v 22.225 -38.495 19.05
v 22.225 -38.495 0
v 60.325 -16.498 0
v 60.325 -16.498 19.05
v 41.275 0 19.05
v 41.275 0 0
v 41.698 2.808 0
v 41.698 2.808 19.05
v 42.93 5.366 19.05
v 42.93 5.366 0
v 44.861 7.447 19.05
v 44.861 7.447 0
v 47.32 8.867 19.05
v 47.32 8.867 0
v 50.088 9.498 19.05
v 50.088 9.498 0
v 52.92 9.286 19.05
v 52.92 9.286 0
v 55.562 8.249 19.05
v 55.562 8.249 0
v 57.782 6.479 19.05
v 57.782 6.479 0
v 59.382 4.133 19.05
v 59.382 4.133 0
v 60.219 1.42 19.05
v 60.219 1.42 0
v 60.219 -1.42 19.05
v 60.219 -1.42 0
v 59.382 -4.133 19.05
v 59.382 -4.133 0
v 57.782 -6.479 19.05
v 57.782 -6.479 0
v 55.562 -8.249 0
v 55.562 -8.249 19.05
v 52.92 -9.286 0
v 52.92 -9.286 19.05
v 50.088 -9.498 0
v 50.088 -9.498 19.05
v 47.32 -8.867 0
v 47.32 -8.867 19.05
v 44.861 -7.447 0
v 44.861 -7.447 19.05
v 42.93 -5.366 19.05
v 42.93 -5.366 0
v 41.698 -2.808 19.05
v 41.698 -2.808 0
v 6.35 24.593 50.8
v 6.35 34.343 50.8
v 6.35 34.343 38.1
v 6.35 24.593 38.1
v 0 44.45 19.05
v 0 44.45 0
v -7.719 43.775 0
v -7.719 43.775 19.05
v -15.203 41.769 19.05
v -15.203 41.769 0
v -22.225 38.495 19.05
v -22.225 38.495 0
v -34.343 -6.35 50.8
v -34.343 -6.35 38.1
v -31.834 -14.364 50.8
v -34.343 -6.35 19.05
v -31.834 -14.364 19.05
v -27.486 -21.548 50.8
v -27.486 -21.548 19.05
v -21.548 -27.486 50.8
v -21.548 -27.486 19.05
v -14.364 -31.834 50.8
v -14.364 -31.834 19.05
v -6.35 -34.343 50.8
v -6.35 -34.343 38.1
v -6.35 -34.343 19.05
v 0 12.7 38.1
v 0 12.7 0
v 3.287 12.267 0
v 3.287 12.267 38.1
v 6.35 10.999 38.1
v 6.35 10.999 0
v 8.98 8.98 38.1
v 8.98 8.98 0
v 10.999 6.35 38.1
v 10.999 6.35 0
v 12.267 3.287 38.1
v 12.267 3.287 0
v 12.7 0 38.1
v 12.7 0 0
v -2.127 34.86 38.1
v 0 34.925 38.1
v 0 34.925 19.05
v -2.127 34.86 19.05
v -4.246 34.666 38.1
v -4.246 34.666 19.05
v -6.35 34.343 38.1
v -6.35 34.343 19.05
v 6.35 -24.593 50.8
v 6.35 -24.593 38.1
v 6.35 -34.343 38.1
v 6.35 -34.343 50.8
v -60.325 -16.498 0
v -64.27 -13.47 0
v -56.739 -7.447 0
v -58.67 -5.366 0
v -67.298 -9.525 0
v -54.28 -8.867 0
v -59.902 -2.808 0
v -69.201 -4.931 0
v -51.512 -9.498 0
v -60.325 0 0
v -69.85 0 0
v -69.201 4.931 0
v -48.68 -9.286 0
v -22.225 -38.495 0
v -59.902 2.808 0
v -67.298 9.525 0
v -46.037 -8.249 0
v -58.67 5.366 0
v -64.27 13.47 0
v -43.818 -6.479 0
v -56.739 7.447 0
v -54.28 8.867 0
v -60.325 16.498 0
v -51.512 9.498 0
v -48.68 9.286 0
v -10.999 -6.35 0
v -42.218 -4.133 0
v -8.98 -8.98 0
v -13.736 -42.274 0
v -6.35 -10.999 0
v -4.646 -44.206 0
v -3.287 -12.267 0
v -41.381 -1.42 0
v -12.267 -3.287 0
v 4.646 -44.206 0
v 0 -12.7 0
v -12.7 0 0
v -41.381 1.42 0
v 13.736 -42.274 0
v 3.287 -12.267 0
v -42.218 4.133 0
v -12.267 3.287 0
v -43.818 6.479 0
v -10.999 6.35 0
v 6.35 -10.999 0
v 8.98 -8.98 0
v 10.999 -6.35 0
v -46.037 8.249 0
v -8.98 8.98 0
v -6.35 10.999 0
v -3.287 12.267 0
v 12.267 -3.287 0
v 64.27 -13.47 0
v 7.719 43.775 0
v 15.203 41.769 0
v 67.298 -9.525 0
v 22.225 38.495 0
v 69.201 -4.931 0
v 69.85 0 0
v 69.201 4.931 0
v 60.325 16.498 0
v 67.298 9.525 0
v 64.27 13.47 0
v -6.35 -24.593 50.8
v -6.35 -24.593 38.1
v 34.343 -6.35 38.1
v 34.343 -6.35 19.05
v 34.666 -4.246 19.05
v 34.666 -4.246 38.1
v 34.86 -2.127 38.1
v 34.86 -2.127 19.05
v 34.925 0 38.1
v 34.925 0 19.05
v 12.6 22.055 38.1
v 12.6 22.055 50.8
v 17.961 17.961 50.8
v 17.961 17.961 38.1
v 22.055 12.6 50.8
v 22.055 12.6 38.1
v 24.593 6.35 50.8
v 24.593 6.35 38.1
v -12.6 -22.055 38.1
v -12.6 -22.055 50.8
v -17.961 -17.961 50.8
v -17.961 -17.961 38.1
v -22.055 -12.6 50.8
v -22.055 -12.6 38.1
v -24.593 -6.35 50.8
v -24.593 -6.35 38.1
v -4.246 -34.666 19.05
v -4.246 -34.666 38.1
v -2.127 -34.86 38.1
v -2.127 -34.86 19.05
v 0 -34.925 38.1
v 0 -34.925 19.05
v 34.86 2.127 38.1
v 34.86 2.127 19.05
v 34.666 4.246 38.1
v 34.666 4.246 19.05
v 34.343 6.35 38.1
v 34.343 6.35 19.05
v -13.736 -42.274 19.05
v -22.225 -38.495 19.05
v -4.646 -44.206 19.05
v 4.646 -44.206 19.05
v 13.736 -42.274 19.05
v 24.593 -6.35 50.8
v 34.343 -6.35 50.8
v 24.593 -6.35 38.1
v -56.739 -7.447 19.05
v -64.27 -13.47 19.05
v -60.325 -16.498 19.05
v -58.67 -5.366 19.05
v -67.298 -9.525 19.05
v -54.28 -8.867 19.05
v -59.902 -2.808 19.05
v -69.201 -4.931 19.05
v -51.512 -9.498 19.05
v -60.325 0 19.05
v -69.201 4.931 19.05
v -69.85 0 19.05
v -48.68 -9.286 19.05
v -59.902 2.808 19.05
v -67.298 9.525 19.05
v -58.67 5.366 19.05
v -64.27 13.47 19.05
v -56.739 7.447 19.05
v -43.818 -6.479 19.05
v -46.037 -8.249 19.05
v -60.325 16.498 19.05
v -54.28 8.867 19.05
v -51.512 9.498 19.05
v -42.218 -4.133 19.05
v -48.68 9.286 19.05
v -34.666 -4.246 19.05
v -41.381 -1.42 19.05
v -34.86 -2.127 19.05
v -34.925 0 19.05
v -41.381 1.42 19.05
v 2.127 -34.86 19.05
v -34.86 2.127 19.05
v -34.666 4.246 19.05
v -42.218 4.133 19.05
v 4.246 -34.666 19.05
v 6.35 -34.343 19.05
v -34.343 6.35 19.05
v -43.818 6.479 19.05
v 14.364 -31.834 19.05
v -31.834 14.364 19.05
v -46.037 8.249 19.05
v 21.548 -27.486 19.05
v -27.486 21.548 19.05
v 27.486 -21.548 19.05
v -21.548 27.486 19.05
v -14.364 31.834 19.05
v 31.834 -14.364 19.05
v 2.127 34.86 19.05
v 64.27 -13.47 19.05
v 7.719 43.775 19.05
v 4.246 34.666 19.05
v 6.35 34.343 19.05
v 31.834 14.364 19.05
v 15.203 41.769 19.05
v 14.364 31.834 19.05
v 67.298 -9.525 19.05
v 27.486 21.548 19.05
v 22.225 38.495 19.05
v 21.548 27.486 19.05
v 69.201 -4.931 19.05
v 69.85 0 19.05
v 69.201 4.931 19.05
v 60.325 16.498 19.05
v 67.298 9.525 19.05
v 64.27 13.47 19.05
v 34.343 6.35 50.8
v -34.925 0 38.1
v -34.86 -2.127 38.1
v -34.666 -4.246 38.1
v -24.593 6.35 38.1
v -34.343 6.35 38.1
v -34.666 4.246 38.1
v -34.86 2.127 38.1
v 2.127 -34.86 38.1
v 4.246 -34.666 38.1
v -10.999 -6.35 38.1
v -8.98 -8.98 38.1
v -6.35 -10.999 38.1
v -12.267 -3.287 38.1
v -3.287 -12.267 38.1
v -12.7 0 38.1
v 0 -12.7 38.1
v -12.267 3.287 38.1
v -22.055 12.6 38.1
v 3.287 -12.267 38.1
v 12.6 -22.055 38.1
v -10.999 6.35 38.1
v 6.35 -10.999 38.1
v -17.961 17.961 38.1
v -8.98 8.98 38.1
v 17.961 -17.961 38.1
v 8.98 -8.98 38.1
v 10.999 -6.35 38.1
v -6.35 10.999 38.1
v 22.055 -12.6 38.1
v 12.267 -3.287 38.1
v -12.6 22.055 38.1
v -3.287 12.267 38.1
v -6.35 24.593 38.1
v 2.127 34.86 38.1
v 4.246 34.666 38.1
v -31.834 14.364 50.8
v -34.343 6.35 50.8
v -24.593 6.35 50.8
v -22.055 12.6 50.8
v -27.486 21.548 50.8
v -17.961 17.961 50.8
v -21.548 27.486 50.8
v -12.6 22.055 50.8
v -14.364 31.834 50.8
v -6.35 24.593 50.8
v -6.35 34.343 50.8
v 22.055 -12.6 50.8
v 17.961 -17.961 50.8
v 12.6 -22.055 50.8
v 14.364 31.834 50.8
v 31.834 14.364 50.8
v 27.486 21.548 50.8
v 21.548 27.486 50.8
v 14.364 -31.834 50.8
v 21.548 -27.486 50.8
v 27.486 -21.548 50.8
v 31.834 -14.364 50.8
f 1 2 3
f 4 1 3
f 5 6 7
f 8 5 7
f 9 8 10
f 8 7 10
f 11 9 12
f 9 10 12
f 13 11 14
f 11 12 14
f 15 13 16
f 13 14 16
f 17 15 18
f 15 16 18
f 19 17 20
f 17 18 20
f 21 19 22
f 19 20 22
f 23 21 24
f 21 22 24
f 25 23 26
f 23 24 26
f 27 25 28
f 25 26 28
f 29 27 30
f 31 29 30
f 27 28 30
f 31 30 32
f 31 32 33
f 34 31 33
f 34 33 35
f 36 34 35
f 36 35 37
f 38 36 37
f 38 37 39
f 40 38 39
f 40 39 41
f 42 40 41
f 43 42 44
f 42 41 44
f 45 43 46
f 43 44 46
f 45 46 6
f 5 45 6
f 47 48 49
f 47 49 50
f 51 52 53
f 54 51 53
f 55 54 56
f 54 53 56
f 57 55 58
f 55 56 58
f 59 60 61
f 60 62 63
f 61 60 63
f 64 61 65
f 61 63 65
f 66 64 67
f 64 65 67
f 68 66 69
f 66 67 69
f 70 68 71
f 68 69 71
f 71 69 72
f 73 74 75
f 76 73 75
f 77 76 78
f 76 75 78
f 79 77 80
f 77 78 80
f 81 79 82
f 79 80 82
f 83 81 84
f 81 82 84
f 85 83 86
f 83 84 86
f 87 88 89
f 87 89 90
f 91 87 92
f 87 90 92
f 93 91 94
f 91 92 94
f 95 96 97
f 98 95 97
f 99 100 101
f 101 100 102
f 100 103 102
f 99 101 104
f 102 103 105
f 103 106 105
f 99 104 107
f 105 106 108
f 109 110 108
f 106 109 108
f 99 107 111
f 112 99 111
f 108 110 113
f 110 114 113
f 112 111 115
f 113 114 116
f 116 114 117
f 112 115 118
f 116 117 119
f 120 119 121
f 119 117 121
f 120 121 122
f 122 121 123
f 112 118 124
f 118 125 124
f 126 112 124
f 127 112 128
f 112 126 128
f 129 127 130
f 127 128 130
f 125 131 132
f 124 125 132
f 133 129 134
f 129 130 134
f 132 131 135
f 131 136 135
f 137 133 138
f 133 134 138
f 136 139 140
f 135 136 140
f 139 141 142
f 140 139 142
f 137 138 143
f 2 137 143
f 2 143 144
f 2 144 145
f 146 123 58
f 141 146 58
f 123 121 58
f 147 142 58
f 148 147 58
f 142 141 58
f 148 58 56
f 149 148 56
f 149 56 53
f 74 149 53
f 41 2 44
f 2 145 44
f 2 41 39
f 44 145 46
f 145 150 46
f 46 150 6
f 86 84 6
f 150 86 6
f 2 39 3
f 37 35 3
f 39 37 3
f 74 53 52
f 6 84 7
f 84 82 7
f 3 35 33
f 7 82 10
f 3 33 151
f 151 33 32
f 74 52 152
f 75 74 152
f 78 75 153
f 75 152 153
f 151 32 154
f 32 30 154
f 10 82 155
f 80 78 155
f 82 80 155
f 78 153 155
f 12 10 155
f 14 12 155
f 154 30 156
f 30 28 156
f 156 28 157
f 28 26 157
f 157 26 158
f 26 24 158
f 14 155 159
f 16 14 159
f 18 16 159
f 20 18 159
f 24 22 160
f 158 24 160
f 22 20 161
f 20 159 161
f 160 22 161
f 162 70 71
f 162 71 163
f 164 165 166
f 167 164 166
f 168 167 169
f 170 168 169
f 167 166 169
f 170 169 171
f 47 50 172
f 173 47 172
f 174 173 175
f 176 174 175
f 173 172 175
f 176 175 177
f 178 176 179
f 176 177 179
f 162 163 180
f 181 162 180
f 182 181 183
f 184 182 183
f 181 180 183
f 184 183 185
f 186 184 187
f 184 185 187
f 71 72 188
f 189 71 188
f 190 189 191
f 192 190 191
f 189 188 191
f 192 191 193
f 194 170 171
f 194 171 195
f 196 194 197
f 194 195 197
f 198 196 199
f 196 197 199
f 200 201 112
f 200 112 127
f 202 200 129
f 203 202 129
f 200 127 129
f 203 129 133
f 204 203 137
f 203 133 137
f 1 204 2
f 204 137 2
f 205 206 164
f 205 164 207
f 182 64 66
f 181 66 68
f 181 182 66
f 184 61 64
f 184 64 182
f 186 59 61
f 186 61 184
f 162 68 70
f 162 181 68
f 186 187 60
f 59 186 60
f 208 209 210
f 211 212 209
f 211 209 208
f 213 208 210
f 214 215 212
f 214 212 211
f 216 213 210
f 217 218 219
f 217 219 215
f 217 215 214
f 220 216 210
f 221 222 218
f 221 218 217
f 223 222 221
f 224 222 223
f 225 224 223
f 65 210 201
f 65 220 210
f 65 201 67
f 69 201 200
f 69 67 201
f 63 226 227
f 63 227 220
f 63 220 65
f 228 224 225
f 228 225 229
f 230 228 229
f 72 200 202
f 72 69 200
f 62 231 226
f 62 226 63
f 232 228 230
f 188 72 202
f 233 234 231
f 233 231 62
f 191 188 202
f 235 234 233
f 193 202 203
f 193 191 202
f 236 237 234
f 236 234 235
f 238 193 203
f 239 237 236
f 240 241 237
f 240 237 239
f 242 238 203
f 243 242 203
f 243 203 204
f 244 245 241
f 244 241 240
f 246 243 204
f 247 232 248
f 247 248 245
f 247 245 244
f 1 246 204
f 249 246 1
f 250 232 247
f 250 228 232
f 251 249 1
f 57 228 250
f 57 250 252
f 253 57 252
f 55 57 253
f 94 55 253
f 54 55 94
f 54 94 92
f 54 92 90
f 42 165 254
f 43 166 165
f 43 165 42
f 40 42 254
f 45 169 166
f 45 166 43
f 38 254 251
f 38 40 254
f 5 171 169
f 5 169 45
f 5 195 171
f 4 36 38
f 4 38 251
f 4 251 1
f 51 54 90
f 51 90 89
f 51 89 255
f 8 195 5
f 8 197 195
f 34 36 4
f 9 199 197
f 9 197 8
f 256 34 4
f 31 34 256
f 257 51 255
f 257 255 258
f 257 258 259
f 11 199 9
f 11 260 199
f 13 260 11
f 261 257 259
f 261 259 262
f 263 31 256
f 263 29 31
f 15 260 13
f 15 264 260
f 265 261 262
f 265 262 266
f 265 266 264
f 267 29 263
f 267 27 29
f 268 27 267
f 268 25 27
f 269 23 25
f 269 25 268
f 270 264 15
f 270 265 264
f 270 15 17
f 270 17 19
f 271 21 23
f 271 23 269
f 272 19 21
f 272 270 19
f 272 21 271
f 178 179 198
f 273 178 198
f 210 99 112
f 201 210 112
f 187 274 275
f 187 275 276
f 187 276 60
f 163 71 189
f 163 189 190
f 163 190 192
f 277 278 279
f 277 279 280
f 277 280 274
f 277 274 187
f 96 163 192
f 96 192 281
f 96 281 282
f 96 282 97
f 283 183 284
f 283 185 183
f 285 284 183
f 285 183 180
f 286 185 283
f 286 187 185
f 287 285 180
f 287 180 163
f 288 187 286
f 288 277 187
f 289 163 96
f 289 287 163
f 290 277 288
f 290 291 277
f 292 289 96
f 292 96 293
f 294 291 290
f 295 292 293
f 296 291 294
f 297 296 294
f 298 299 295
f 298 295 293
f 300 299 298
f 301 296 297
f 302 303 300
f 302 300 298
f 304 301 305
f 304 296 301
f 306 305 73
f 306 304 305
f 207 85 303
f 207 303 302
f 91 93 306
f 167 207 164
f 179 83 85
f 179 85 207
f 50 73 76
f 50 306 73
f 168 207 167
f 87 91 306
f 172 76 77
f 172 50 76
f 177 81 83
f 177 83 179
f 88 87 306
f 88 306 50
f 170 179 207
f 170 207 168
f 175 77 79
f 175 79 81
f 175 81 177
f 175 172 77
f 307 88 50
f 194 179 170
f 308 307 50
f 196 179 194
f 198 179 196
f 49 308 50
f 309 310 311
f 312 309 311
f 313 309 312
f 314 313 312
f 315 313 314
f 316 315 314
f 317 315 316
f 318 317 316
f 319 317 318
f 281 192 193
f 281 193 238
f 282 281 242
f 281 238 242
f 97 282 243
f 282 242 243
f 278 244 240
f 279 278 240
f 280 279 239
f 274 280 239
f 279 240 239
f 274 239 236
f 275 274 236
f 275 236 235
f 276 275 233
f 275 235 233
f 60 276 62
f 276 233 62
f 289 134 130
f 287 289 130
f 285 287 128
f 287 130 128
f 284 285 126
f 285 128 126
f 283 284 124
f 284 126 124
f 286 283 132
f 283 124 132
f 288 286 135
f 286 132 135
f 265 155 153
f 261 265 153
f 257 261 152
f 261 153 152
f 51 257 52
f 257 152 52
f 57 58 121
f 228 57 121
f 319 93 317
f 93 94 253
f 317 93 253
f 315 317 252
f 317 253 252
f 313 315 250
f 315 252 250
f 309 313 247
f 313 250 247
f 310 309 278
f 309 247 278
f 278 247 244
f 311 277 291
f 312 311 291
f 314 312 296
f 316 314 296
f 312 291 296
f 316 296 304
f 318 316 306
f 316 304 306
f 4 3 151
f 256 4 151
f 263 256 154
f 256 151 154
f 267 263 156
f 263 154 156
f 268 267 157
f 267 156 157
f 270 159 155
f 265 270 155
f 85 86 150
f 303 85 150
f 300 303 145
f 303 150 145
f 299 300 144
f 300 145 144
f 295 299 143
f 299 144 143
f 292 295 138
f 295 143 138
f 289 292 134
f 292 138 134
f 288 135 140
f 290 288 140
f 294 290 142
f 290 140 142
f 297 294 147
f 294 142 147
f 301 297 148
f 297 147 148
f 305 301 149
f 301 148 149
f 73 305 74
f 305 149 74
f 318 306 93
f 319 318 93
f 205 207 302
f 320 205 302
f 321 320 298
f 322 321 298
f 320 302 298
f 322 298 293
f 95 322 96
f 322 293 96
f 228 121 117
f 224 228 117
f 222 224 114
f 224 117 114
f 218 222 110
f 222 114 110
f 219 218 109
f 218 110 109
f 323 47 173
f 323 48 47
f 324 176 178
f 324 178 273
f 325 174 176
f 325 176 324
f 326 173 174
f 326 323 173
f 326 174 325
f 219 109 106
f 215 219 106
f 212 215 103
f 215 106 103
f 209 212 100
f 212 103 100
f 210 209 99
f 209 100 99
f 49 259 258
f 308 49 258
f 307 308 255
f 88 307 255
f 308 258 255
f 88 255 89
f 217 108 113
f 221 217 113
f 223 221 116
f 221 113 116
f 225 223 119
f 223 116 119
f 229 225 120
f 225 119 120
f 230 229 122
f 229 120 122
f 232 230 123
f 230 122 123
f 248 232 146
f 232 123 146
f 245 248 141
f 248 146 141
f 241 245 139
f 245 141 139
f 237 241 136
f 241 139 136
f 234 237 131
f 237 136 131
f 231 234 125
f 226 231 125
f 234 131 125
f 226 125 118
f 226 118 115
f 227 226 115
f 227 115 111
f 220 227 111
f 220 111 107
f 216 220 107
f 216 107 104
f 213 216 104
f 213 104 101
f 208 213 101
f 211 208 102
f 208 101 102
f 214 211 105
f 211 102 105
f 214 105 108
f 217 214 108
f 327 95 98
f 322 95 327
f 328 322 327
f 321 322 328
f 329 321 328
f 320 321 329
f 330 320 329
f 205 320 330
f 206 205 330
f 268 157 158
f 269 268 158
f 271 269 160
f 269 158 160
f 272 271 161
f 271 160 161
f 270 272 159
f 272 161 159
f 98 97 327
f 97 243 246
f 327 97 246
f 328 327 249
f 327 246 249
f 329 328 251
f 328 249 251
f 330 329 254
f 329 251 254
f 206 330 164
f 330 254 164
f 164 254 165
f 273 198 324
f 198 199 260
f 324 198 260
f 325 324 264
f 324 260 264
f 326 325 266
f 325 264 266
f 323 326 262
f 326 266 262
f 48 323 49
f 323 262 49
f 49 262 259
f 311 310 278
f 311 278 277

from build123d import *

# Parameters (mm, degrees)
F1_DEPTH = 19.05
F2_DEPTH = 38.1
F3_DEPTH = 50.8


with BuildPart() as f1:
    # F0 (on Top) → F1 (new body)
    with BuildSketch(Plane.XY):
        with BuildLine():
            Line((41.275, 0), (34.925, 0))
            ThreePointArc((34.925, 0), (34.7791644937, -3.1883133656), (34.3428758988, -6.35))
            ThreePointArc((34.3428758988, -6.35), (24.6957043329, -24.6957043329), (6.35, -34.3428758988))
            ThreePointArc((6.35, -34.3428758988), (3.1883133656, -34.7791644937), (0, -34.925))
            ThreePointArc((0, -34.925), (-3.1883133656, -34.7791644937), (-6.35, -34.3428758988))
            ThreePointArc((-6.35, -34.3428758988), (-24.6957043329, -24.6957043329), (-34.3428758988, -6.35))
            ThreePointArc((-34.3428758988, -6.35), (-34.7791644937, -3.1883133656), (-34.925, 0))
            ThreePointArc((-34.925, 0), (-34.7791644937, 3.1883133656), (-34.3428758988, 6.35))
            ThreePointArc((-34.3428758988, 6.35), (-24.6957043329, 24.6957043329), (-6.35, 34.3428758988))
            ThreePointArc((-6.35, 34.3428758988), (-3.1883133656, 34.7791644937), (0, 34.925))
            Line((0, 34.925), (0, 44.45))
            ThreePointArc((0, 44.45), (-11.5045065548, 42.9354029785), (-22.225, 38.4948291982))
            Line((-22.225, 38.4948291982), (-60.325, 16.4977839421))
            ThreePointArc((-60.325, 16.4977839421), (-67.2977839421, 9.525), (-69.85, 0))
            ThreePointArc((-69.85, 0), (-67.2977839421, -9.525), (-60.325, -16.4977839421))
            Line((-60.325, -16.4977839421), (-22.225, -38.4948291982))
            ThreePointArc((-22.225, -38.4948291982), (0, -44.45), (22.225, -38.4948291982))
            Line((22.225, -38.4948291982), (60.325, -16.4977839421))
            ThreePointArc((60.325, -16.4977839421), (67.2977839421, -9.525), (69.85, 0))
            Line((69.85, 0), (60.325, 0))
            ThreePointArc((60.325, 0), (50.8, -9.525), (41.275, 0))
        make_face()
        with BuildLine():
            ThreePointArc((-41.275, 0), (-50.8, -9.525), (-60.325, 0))
            ThreePointArc((-60.325, 0), (-50.8, 9.525), (-41.275, 0))
        make_face(mode=Mode.SUBTRACT)
        with BuildLine():
            ThreePointArc((34.3428758988, 6.35), (34.7791644937, 3.1883133656), (34.925, 0))
            Line((34.925, 0), (41.275, 0))
            ThreePointArc((41.275, 0), (50.8, 9.525), (60.325, 0))
            Line((60.325, 0), (69.85, 0))
            ThreePointArc((69.85, 0), (67.2977839421, 9.525), (60.325, 16.4977839421))
            Line((60.325, 16.4977839421), (22.225, 38.4948291982))
            ThreePointArc((22.225, 38.4948291982), (11.5045065548, 42.9354029785), (0, 44.45))
            Line((0, 44.45), (0, 34.925))
            ThreePointArc((0, 34.925), (3.1883133656, 34.7791644937), (6.35, 34.3428758988))
            ThreePointArc((6.35, 34.3428758988), (24.6957043329, 24.6957043329), (34.3428758988, 6.35))
        make_face()
    extrude(amount=F1_DEPTH)

    # F0 (on Top) → F2 (join)
    with BuildSketch(Plane.XY):
        with BuildLine():
            Line((-6.35, -34.3428758988), (-6.35, -24.5934442484))
            ThreePointArc((-6.35, -24.5934442484), (-17.9605122421, -17.9605122421), (-24.5934442484, -6.35))
            Line((-24.5934442484, -6.35), (-34.3428758988, -6.35))
            ThreePointArc((-34.3428758988, -6.35), (-24.6957043329, -24.6957043329), (-6.35, -34.3428758988))
        make_face()
        with BuildLine():
            ThreePointArc((-24.5934442484, -6.35), (-25.1975542852, -3.2005090291), (-25.4, 0))
            Line((-25.4, 0), (-34.925, 0))
            ThreePointArc((-34.925, 0), (-34.7791644937, -3.1883133656), (-34.3428758988, -6.35))
            Line((-34.3428758988, -6.35), (-24.5934442484, -6.35))
        make_face()
        with BuildLine():
            Line((-34.925, 0), (-25.4, 0))
            ThreePointArc((-25.4, 0), (-25.1975542852, 3.2005090291), (-24.5934442484, 6.35))
            Line((-24.5934442484, 6.35), (-34.3428758988, 6.35))
            ThreePointArc((-34.3428758988, 6.35), (-34.7791644937, 3.1883133656), (-34.925, 0))
        make_face()
        with BuildLine():
            ThreePointArc((-24.5934442484, 6.35), (-17.9605122421, 17.9605122421), (-6.35, 24.5934442484))
            Line((-6.35, 24.5934442484), (-6.35, 34.3428758988))
            ThreePointArc((-6.35, 34.3428758988), (-24.6957043329, 24.6957043329), (-34.3428758988, 6.35))
            Line((-34.3428758988, 6.35), (-24.5934442484, 6.35))
        make_face()
        with BuildLine():
            ThreePointArc((-6.35, 24.5934442484), (-3.2005090291, 25.1975542852), (0, 25.4))
            Line((0, 25.4), (0, 34.925))
            ThreePointArc((0, 34.925), (-3.1883133656, 34.7791644937), (-6.35, 34.3428758988))
            Line((-6.35, 34.3428758988), (-6.35, 24.5934442484))
        make_face()
        with BuildLine():
            Line((0, 34.925), (0, 25.4))
            ThreePointArc((0, 25.4), (3.2005090291, 25.1975542852), (6.35, 24.5934442484))
            Line((6.35, 24.5934442484), (6.35, 34.3428758988))
            ThreePointArc((6.35, 34.3428758988), (3.1883133656, 34.7791644937), (0, 34.925))
        make_face()
        with BuildLine():
            ThreePointArc((6.35, 24.5934442484), (17.9605122421, 17.9605122421), (24.5934442484, 6.35))
            Line((24.5934442484, 6.35), (34.3428758988, 6.35))
            ThreePointArc((34.3428758988, 6.35), (24.6957043329, 24.6957043329), (6.35, 34.3428758988))
            Line((6.35, 34.3428758988), (6.35, 24.5934442484))
        make_face()
        with BuildLine():
            ThreePointArc((24.5934442484, 6.35), (25.1975542852, 3.2005090291), (25.4, 0))
            Line((25.4, 0), (34.925, 0))
            ThreePointArc((34.925, 0), (34.7791644937, 3.1883133656), (34.3428758988, 6.35))
            Line((34.3428758988, 6.35), (24.5934442484, 6.35))
        make_face()
        with BuildLine():
            ThreePointArc((6.35, -24.5934442484), (3.2005090291, -25.1975542852), (0, -25.4))
            Line((0, -25.4), (0, -34.925))
            ThreePointArc((0, -34.925), (3.1883133656, -34.7791644937), (6.35, -34.3428758988))
            Line((6.35, -34.3428758988), (6.35, -24.5934442484))
        make_face()
        with BuildLine():
            Line((0, -34.925), (0, -25.4))
            ThreePointArc((0, -25.4), (-3.2005090291, -25.1975542852), (-6.35, -24.5934442484))
            Line((-6.35, -24.5934442484), (-6.35, -34.3428758988))
            ThreePointArc((-6.35, -34.3428758988), (-3.1883133656, -34.7791644937), (0, -34.925))
        make_face()
        with BuildLine():
            Line((34.925, 0), (25.4, 0))
            ThreePointArc((25.4, 0), (25.1975542852, -3.2005090291), (24.5934442484, -6.35))
            Line((24.5934442484, -6.35), (34.3428758988, -6.35))
            ThreePointArc((34.3428758988, -6.35), (34.7791644937, -3.1883133656), (34.925, 0))
        make_face()
        with BuildLine():
            Line((34.3428758988, -6.35), (24.5934442484, -6.35))
            ThreePointArc((24.5934442484, -6.35), (17.9605122421, -17.9605122421), (6.35, -24.5934442484))
            Line((6.35, -24.5934442484), (6.35, -34.3428758988))
            ThreePointArc((6.35, -34.3428758988), (24.6957043329, -24.6957043329), (34.3428758988, -6.35))
        make_face()
        with BuildLine():
            Line((0, -25.4), (0, -12.7))
            ThreePointArc((0, -12.7), (-8.9802561211, -8.9802561211), (-12.7, 0))
            Line((-12.7, 0), (-25.4, 0))
            ThreePointArc((-25.4, 0), (-25.1975542852, -3.2005090291), (-24.5934442484, -6.35))
            ThreePointArc((-24.5934442484, -6.35), (-17.9605122421, -17.9605122421), (-6.35, -24.5934442484))
            ThreePointArc((-6.35, -24.5934442484), (-3.2005090291, -25.1975542852), (0, -25.4))
        make_face()
        with BuildLine():
            Line((25.4, 0), (12.7, 0))
            ThreePointArc((12.7, 0), (8.9802561211, -8.9802561211), (0, -12.7))
            Line((0, -12.7), (0, -25.4))
            ThreePointArc((0, -25.4), (3.2005090291, -25.1975542852), (6.35, -24.5934442484))
            ThreePointArc((6.35, -24.5934442484), (17.9605122421, -17.9605122421), (24.5934442484, -6.35))
            ThreePointArc((24.5934442484, -6.35), (25.1975542852, -3.2005090291), (25.4, 0))
        make_face()
        with BuildLine():
            ThreePointArc((0, 12.7), (8.9802561211, 8.9802561211), (12.7, 0))
            Line((12.7, 0), (25.4, 0))
            ThreePointArc((25.4, 0), (25.1975542852, 3.2005090291), (24.5934442484, 6.35))
            ThreePointArc((24.5934442484, 6.35), (17.9605122421, 17.9605122421), (6.35, 24.5934442484))
            ThreePointArc((6.35, 24.5934442484), (3.2005090291, 25.1975542852), (0, 25.4))
            Line((0, 25.4), (0, 12.7))
        make_face()
        with BuildLine():
            ThreePointArc((-12.7, 0), (-8.9802561211, 8.9802561211), (0, 12.7))
            Line((0, 12.7), (0, 25.4))
            ThreePointArc((0, 25.4), (-3.2005090291, 25.1975542852), (-6.35, 24.5934442484))
            ThreePointArc((-6.35, 24.5934442484), (-17.9605122421, 17.9605122421), (-24.5934442484, 6.35))
            ThreePointArc((-24.5934442484, 6.35), (-25.1975542852, 3.2005090291), (-25.4, 0))
            Line((-25.4, 0), (-12.7, 0))
        make_face()
    extrude(amount=F2_DEPTH)

    # F0 (on Top) → F3 (join)
    with BuildSketch(Plane.XY):
        with BuildLine():
            Line((-6.35, -34.3428758988), (-6.35, -24.5934442484))
            ThreePointArc((-6.35, -24.5934442484), (-17.9605122421, -17.9605122421), (-24.5934442484, -6.35))
            Line((-24.5934442484, -6.35), (-34.3428758988, -6.35))
            ThreePointArc((-34.3428758988, -6.35), (-24.6957043329, -24.6957043329), (-6.35, -34.3428758988))
        make_face()
        with BuildLine():
            Line((34.3428758988, -6.35), (24.5934442484, -6.35))
            ThreePointArc((24.5934442484, -6.35), (17.9605122421, -17.9605122421), (6.35, -24.5934442484))
            Line((6.35, -24.5934442484), (6.35, -34.3428758988))
            ThreePointArc((6.35, -34.3428758988), (24.6957043329, -24.6957043329), (34.3428758988, -6.35))
        make_face()
        with BuildLine():
            ThreePointArc((6.35, 24.5934442484), (17.9605122421, 17.9605122421), (24.5934442484, 6.35))
            Line((24.5934442484, 6.35), (34.3428758988, 6.35))
            ThreePointArc((34.3428758988, 6.35), (24.6957043329, 24.6957043329), (6.35, 34.3428758988))
            Line((6.35, 34.3428758988), (6.35, 24.5934442484))
        make_face()
        with BuildLine():
            ThreePointArc((-24.5934442484, 6.35), (-17.9605122421, 17.9605122421), (-6.35, 24.5934442484))
            Line((-6.35, 24.5934442484), (-6.35, 34.3428758988))
            ThreePointArc((-6.35, 34.3428758988), (-24.6957043329, 24.6957043329), (-34.3428758988, 6.35))
            Line((-34.3428758988, 6.35), (-24.5934442484, 6.35))
        make_face()
    extrude(amount=F3_DEPTH)


solid = f1.part
